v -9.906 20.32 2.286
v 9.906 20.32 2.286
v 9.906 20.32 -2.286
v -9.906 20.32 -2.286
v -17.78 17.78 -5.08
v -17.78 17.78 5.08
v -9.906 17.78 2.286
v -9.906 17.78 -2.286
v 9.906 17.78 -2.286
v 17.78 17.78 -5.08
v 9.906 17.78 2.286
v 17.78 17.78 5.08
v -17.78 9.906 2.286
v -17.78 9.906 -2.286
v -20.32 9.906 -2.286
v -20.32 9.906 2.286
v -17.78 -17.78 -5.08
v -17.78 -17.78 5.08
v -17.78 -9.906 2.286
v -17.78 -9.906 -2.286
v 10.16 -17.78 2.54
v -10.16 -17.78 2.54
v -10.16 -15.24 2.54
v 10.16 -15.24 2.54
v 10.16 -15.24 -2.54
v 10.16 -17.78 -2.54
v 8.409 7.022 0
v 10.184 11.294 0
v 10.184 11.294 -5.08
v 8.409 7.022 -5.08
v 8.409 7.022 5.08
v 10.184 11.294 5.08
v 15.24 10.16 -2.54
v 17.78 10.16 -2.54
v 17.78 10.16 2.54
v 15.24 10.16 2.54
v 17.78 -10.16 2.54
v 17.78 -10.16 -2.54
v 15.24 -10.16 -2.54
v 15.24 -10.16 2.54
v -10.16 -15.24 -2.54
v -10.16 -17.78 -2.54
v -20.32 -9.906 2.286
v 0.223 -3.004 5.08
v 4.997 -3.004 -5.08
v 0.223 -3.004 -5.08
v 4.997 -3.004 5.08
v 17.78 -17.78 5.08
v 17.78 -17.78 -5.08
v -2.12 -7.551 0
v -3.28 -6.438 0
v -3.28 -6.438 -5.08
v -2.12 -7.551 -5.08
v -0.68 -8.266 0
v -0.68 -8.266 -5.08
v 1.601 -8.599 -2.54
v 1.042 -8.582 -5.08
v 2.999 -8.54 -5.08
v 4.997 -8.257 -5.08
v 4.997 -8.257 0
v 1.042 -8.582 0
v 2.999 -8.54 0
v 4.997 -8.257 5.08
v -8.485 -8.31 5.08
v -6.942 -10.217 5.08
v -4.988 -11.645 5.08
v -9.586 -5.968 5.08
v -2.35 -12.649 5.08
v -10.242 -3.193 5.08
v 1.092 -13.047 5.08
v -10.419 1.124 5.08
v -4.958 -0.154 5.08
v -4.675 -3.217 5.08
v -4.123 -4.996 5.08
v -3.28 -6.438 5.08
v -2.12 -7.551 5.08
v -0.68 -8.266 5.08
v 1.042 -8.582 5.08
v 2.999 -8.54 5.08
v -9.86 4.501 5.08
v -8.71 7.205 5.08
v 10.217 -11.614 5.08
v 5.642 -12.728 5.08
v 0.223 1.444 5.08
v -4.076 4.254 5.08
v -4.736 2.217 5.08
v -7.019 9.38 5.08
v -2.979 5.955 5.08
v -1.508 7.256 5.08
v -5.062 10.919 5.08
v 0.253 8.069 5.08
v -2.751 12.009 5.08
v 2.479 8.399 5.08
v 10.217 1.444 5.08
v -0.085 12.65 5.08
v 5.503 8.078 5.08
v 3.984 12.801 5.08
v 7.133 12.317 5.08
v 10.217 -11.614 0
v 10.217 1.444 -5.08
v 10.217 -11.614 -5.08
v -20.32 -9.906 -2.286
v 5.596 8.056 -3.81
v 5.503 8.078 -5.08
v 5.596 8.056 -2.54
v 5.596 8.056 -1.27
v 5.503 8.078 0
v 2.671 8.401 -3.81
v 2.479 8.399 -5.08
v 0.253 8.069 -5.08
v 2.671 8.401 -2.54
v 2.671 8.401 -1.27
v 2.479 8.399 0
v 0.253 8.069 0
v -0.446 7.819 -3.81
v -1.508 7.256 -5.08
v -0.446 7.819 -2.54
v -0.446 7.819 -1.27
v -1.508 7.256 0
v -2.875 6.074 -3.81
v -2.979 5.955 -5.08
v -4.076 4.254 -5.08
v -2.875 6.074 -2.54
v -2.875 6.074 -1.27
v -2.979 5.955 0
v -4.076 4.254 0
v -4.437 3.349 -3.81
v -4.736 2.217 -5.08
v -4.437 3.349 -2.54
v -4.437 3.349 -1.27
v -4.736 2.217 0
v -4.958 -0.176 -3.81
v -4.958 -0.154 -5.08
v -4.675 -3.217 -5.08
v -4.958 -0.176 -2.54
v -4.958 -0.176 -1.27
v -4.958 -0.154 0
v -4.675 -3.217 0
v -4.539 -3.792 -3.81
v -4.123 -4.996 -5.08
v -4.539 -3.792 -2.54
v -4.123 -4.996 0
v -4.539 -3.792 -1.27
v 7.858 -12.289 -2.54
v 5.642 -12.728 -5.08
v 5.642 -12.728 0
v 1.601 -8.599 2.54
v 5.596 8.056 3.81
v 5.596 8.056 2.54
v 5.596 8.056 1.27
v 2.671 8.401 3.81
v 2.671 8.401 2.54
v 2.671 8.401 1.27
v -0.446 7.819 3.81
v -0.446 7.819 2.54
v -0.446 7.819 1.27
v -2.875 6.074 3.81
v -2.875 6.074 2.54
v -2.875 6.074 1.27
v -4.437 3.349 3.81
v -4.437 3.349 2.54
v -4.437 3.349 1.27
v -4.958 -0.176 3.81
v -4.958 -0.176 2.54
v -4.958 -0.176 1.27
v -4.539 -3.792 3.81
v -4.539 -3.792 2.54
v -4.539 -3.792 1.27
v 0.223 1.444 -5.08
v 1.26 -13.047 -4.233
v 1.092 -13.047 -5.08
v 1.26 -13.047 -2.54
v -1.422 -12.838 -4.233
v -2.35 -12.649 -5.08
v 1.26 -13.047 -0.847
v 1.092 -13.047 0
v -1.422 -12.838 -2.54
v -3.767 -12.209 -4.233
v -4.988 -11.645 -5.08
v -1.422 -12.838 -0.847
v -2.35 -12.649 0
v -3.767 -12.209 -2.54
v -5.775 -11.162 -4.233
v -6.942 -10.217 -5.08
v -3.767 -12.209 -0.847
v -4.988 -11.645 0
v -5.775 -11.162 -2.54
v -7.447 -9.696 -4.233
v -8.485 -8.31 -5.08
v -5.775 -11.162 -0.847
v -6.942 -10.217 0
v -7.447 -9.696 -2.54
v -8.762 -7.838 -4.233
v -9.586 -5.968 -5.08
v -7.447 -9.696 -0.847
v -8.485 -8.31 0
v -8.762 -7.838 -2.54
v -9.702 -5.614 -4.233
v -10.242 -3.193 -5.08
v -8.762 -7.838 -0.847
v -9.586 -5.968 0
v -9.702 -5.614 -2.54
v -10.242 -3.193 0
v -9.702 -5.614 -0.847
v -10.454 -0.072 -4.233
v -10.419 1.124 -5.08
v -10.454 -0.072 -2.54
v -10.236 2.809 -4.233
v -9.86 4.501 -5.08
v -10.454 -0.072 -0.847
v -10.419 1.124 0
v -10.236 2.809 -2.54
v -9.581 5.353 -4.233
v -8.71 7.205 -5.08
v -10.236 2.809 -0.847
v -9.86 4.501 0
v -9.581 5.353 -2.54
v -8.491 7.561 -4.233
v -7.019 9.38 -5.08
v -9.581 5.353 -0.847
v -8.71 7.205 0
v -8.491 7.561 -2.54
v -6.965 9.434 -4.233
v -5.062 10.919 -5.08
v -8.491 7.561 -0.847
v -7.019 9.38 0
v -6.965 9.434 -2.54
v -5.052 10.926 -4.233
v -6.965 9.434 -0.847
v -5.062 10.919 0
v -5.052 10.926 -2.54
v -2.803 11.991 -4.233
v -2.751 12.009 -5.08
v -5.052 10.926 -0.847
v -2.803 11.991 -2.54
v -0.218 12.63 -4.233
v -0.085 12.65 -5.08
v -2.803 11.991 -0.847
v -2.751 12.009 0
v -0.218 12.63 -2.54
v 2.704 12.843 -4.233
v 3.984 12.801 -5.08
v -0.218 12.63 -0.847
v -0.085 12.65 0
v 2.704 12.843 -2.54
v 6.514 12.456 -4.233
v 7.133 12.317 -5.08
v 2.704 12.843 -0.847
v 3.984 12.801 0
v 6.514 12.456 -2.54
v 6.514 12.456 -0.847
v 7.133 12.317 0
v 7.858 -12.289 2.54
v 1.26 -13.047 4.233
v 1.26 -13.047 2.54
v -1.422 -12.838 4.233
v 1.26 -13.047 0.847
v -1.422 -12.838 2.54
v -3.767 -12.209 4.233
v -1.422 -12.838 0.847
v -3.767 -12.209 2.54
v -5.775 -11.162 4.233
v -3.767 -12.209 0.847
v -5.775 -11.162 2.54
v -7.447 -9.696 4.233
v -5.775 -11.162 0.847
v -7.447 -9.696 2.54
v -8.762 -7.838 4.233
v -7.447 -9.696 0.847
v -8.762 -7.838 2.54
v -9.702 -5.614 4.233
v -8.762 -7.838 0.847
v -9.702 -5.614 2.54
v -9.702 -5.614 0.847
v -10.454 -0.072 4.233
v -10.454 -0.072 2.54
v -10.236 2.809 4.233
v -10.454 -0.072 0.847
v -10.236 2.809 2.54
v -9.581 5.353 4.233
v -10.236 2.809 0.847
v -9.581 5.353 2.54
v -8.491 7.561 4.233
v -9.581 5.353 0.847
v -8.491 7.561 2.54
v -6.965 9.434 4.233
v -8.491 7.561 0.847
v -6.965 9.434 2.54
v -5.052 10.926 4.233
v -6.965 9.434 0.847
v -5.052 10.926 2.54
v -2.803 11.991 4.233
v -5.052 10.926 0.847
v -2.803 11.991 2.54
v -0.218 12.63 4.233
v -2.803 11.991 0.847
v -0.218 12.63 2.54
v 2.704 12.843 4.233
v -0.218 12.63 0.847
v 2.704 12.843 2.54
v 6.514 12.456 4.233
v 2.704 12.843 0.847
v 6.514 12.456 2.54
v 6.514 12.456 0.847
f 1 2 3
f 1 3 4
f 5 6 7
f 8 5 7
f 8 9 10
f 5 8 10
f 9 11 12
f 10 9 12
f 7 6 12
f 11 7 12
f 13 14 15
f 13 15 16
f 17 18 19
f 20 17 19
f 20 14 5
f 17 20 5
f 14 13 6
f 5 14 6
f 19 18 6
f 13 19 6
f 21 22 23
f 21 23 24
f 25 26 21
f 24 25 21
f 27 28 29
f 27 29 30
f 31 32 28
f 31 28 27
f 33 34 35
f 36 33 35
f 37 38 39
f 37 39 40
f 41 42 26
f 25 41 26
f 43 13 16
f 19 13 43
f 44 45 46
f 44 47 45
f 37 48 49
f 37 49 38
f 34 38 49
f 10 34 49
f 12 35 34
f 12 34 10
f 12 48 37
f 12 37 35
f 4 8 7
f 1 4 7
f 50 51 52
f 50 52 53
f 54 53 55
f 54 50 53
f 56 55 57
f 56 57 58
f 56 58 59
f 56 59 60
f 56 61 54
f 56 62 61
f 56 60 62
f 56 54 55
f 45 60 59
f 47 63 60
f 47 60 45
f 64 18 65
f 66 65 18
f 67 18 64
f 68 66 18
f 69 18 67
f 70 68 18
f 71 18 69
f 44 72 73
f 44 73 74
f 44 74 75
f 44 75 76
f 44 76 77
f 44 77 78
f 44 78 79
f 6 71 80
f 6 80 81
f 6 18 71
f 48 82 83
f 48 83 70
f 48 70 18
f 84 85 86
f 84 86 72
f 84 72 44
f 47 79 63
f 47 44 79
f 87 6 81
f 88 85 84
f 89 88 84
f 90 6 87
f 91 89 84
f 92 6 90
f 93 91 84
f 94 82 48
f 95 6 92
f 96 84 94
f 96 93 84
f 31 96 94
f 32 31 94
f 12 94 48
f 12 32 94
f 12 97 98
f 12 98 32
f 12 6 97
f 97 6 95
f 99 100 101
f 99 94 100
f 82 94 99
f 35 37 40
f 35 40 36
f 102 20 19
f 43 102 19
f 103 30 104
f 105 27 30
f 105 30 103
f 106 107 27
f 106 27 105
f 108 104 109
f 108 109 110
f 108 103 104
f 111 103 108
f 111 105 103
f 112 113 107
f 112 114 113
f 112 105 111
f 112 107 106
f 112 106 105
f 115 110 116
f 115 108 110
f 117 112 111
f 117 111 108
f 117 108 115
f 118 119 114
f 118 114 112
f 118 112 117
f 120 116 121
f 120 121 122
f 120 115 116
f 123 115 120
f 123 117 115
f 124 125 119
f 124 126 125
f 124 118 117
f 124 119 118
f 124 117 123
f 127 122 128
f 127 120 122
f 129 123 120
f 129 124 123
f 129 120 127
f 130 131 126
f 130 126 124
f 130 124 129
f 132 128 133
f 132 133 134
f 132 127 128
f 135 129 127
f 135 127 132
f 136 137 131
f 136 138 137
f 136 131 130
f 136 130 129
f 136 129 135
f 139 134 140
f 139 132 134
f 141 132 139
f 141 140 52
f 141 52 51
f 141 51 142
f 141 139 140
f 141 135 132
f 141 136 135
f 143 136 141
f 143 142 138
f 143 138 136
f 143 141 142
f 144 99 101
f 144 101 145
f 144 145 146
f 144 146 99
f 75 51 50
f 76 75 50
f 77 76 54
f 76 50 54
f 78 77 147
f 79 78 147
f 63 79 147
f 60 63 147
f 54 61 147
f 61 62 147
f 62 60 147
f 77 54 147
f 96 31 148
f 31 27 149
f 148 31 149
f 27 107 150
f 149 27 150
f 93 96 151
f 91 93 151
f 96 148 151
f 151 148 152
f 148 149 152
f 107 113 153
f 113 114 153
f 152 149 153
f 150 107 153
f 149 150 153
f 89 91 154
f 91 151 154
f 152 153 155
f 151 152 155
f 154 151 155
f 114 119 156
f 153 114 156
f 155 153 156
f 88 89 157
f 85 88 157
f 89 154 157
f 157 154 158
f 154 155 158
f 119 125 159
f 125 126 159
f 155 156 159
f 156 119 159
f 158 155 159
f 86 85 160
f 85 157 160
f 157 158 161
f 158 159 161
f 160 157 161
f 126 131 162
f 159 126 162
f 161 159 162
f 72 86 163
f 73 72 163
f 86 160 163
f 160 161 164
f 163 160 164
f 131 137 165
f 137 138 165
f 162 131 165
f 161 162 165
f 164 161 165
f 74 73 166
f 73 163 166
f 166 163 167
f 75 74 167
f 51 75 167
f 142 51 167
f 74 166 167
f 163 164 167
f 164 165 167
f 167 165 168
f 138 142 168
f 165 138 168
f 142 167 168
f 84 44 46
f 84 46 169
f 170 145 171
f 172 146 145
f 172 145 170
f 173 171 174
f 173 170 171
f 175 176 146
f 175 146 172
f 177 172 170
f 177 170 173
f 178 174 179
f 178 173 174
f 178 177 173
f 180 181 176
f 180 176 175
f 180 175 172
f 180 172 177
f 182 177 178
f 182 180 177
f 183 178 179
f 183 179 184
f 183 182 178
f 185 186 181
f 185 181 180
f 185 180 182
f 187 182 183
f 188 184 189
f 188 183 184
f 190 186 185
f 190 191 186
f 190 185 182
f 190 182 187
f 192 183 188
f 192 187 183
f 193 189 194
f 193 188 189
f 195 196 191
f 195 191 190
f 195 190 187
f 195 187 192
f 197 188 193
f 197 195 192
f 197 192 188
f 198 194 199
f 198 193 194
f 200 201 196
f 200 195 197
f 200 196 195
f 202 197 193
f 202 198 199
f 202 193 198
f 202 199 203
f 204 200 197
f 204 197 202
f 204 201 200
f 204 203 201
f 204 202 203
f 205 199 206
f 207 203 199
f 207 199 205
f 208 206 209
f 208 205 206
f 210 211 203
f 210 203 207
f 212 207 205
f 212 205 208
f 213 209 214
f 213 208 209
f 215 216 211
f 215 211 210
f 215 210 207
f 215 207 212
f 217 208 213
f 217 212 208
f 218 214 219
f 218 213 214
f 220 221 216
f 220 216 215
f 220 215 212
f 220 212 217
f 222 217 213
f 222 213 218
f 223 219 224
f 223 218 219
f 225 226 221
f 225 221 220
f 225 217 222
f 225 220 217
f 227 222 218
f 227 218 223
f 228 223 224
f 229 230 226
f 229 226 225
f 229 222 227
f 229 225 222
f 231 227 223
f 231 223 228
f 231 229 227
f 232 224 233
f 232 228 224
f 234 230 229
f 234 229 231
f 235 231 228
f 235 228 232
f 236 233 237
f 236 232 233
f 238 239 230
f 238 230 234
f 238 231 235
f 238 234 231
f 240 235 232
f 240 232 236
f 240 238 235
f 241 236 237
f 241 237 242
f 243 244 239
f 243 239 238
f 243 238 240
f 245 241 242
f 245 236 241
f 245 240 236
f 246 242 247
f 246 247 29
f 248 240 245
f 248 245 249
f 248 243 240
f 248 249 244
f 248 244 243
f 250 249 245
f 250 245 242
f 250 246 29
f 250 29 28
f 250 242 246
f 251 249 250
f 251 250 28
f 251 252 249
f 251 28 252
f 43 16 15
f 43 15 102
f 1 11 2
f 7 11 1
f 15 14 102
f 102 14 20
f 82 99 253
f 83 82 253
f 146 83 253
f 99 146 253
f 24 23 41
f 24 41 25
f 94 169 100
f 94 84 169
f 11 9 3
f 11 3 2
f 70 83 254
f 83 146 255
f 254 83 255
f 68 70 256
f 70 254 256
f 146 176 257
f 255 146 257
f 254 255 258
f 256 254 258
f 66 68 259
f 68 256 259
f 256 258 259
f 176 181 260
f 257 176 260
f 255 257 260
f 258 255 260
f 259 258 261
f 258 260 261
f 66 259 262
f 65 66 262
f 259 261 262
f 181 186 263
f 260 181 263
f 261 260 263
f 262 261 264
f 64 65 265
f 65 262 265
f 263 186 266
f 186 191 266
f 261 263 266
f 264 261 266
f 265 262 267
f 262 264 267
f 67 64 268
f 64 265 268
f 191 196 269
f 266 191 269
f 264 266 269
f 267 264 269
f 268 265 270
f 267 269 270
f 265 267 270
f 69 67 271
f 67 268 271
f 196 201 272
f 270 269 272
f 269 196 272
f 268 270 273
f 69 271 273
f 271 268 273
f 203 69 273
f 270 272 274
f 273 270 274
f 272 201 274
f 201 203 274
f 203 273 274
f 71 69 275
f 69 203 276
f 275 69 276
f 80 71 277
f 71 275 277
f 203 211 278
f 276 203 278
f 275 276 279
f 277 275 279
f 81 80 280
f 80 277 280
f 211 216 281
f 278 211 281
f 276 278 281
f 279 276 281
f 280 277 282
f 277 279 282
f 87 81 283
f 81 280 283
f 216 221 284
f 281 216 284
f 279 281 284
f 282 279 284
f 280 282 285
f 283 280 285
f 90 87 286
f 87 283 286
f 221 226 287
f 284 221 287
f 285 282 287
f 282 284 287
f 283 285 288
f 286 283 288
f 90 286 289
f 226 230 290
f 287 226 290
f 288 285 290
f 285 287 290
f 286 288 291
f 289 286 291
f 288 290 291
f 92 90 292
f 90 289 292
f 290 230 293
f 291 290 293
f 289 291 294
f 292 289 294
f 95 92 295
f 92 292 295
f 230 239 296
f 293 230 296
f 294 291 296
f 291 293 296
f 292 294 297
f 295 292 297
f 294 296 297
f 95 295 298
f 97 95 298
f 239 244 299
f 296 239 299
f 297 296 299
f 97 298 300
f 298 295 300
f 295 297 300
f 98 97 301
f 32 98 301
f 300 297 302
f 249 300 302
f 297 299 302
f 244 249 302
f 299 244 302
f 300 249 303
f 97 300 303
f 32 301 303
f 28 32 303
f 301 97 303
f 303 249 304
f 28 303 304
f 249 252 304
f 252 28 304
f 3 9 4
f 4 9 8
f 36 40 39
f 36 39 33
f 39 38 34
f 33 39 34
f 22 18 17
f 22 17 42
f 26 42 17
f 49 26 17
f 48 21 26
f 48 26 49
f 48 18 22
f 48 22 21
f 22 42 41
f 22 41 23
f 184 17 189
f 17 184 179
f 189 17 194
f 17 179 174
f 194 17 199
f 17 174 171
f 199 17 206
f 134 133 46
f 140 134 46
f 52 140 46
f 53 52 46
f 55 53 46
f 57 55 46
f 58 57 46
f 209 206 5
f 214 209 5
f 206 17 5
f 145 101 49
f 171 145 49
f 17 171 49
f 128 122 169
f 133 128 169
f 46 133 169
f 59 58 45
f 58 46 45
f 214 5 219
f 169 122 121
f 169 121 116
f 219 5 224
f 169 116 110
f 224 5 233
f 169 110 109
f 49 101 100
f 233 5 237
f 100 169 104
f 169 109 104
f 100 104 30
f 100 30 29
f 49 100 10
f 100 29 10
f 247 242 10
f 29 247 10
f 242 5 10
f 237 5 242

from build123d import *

# Parameters (mm, degrees)
F0_W     = 35.56
F0_H     = 35.56
F1_DEPTH = 5.08
F2_W     = 19.812
F2_H     = 4.572
F3_DEPTH = 2.54
F4_W     = 19.812
F4_H     = 4.572
F5_DEPTH = 2.54
F6_W     = 20.32
F6_H     = 5.08
F7_DEPTH = 2.54
F8_W     = 20.32
F8_H     = 5.08
F9_DEPTH = 2.54


with BuildPart() as f1:
    # F0 (on Top) → F1 (new body, symmetric)
    with BuildSketch(Plane.XY):
        Rectangle(F0_W, F0_H)
        with BuildLine():
            Line((0.2232421875, -3.0041232639), (0.2232421875, 1.4441840278))
            Line((0.2232421875, 1.4441840278), (10.2167751736, 1.4441840278))
            Line((10.2167751736, 1.4441840278), (10.2167751736, -11.6141059028))
            add(Edge.make_bspline(
                [(10.2167751736, -11.6141059028), (7.7859157986, -12.4078559028), (5.6416883681, -12.7275607639)],
                knots=[0, 0, 0, 1, 1, 1], degree=2))
            add(Edge.make_bspline(
                [(5.6416883681, -12.7275607639), (3.4974609375, -13.047265625), (1.2595269097, -13.047265625)],
                knots=[0, 0, 0, 1, 1, 1], degree=2))
            add(Edge.make_bspline(
                [(1.2595269097, -13.047265625), (-4.4400390625, -13.047265625), (-7.4469184028, -9.6958767361)],
                knots=[0, 0, 0, 1, 1, 1], degree=2))
            add(Edge.make_bspline(
                [(-7.4469184028, -9.6958767361), (-10.4537977431, -6.3444878472), (-10.4537977431, -0.0716579861)],
                knots=[0, 0, 0, 1, 1, 1], degree=2))
            add(Edge.make_bspline(
                [(-10.4537977431, -0.0716579861), (-10.4537977431, 6.0247829861), (-6.9646050347, 9.4340494792)],
                knots=[0, 0, 0, 1, 1, 1], degree=2))
            add(Edge.make_bspline(
                [(-6.9646050347, 9.4340494792), (-3.4754123264, 12.8433159722), (2.7037109375, 12.8433159722)],
                knots=[0, 0, 0, 1, 1, 1], degree=2))
            add(Edge.make_bspline(
                [(2.7037109375, 12.8433159722), (6.5842664931, 12.8433159722), (10.1837022569, 11.2944010417)],
                knots=[0, 0, 0, 1, 1, 1], degree=2))
            Line((10.1837022569, 11.2944010417), (8.4087890625, 7.0224826389))
            add(Edge.make_bspline(
                [(8.4087890625, 7.0224826389), (5.6527126736, 8.4005208333), (2.6706380208, 8.4005208333)],
                knots=[0, 0, 0, 1, 1, 1], degree=2))
            add(Edge.make_bspline(
                [(2.6706380208, 8.4005208333), (-0.7909939236, 8.4005208333), (-2.8745876736, 6.0743923611)],
                knots=[0, 0, 0, 1, 1, 1], degree=2))
            add(Edge.make_bspline(
                [(-2.8745876736, 6.0743923611), (-4.9581814236, 3.7482638889), (-4.9581814236, -0.1763888889)],
                knots=[0, 0, 0, 1, 1, 1], degree=2))
            add(Edge.make_bspline(
                [(-4.9581814236, -0.1763888889), (-4.9581814236, -4.2774305556), (-3.2797309028, -6.4381944444)],
                knots=[0, 0, 0, 1, 1, 1], degree=2))
            add(Edge.make_bspline(
                [(-3.2797309028, -6.4381944444), (-1.6012803819, -8.5989583333), (1.6012803819, -8.5989583333)],
                knots=[0, 0, 0, 1, 1, 1], degree=2))
            add(Edge.make_bspline(
                [(1.6012803819, -8.5989583333), (3.2769748264, -8.5989583333), (4.9967664931, -8.2572048611)],
                knots=[0, 0, 0, 1, 1, 1], degree=2))
            Line((4.9967664931, -8.2572048611), (4.9967664931, -3.0041232639))
            Line((4.9967664931, -3.0041232639), (0.2232421875, -3.0041232639))
        make_face(mode=Mode.SUBTRACT)
    extrude(amount=F1_DEPTH, both=True)

    # F2 (on face) → F3 (join)
    with BuildSketch(Plane(origin=(0, 17.78, 0), x_dir=(-1, 0, 0), z_dir=(0, 1, 0))):
        Rectangle(F2_W, F2_H)
    extrude(amount=F3_DEPTH)

    # F4 (on face) → F5 (join)
    with BuildSketch(Plane(origin=(-17.78, 0, 0), x_dir=(0, -1, 0), z_dir=(-1, 0, 0))):
        Rectangle(F4_W, F4_H)
    extrude(amount=F5_DEPTH)

    # F6 (on face) → F7 (cut)
    with BuildSketch(Plane.XZ.offset(17.78)):
        Rectangle(F6_W, F6_H)
    extrude(amount=-F7_DEPTH, mode=Mode.SUBTRACT)

    # F8 (on face) → F9 (cut)
    with BuildSketch(Plane.YZ.offset(17.78)):
        Rectangle(F8_W, F8_H)
    extrude(amount=-F9_DEPTH, mode=Mode.SUBTRACT)


solid = f1.part
